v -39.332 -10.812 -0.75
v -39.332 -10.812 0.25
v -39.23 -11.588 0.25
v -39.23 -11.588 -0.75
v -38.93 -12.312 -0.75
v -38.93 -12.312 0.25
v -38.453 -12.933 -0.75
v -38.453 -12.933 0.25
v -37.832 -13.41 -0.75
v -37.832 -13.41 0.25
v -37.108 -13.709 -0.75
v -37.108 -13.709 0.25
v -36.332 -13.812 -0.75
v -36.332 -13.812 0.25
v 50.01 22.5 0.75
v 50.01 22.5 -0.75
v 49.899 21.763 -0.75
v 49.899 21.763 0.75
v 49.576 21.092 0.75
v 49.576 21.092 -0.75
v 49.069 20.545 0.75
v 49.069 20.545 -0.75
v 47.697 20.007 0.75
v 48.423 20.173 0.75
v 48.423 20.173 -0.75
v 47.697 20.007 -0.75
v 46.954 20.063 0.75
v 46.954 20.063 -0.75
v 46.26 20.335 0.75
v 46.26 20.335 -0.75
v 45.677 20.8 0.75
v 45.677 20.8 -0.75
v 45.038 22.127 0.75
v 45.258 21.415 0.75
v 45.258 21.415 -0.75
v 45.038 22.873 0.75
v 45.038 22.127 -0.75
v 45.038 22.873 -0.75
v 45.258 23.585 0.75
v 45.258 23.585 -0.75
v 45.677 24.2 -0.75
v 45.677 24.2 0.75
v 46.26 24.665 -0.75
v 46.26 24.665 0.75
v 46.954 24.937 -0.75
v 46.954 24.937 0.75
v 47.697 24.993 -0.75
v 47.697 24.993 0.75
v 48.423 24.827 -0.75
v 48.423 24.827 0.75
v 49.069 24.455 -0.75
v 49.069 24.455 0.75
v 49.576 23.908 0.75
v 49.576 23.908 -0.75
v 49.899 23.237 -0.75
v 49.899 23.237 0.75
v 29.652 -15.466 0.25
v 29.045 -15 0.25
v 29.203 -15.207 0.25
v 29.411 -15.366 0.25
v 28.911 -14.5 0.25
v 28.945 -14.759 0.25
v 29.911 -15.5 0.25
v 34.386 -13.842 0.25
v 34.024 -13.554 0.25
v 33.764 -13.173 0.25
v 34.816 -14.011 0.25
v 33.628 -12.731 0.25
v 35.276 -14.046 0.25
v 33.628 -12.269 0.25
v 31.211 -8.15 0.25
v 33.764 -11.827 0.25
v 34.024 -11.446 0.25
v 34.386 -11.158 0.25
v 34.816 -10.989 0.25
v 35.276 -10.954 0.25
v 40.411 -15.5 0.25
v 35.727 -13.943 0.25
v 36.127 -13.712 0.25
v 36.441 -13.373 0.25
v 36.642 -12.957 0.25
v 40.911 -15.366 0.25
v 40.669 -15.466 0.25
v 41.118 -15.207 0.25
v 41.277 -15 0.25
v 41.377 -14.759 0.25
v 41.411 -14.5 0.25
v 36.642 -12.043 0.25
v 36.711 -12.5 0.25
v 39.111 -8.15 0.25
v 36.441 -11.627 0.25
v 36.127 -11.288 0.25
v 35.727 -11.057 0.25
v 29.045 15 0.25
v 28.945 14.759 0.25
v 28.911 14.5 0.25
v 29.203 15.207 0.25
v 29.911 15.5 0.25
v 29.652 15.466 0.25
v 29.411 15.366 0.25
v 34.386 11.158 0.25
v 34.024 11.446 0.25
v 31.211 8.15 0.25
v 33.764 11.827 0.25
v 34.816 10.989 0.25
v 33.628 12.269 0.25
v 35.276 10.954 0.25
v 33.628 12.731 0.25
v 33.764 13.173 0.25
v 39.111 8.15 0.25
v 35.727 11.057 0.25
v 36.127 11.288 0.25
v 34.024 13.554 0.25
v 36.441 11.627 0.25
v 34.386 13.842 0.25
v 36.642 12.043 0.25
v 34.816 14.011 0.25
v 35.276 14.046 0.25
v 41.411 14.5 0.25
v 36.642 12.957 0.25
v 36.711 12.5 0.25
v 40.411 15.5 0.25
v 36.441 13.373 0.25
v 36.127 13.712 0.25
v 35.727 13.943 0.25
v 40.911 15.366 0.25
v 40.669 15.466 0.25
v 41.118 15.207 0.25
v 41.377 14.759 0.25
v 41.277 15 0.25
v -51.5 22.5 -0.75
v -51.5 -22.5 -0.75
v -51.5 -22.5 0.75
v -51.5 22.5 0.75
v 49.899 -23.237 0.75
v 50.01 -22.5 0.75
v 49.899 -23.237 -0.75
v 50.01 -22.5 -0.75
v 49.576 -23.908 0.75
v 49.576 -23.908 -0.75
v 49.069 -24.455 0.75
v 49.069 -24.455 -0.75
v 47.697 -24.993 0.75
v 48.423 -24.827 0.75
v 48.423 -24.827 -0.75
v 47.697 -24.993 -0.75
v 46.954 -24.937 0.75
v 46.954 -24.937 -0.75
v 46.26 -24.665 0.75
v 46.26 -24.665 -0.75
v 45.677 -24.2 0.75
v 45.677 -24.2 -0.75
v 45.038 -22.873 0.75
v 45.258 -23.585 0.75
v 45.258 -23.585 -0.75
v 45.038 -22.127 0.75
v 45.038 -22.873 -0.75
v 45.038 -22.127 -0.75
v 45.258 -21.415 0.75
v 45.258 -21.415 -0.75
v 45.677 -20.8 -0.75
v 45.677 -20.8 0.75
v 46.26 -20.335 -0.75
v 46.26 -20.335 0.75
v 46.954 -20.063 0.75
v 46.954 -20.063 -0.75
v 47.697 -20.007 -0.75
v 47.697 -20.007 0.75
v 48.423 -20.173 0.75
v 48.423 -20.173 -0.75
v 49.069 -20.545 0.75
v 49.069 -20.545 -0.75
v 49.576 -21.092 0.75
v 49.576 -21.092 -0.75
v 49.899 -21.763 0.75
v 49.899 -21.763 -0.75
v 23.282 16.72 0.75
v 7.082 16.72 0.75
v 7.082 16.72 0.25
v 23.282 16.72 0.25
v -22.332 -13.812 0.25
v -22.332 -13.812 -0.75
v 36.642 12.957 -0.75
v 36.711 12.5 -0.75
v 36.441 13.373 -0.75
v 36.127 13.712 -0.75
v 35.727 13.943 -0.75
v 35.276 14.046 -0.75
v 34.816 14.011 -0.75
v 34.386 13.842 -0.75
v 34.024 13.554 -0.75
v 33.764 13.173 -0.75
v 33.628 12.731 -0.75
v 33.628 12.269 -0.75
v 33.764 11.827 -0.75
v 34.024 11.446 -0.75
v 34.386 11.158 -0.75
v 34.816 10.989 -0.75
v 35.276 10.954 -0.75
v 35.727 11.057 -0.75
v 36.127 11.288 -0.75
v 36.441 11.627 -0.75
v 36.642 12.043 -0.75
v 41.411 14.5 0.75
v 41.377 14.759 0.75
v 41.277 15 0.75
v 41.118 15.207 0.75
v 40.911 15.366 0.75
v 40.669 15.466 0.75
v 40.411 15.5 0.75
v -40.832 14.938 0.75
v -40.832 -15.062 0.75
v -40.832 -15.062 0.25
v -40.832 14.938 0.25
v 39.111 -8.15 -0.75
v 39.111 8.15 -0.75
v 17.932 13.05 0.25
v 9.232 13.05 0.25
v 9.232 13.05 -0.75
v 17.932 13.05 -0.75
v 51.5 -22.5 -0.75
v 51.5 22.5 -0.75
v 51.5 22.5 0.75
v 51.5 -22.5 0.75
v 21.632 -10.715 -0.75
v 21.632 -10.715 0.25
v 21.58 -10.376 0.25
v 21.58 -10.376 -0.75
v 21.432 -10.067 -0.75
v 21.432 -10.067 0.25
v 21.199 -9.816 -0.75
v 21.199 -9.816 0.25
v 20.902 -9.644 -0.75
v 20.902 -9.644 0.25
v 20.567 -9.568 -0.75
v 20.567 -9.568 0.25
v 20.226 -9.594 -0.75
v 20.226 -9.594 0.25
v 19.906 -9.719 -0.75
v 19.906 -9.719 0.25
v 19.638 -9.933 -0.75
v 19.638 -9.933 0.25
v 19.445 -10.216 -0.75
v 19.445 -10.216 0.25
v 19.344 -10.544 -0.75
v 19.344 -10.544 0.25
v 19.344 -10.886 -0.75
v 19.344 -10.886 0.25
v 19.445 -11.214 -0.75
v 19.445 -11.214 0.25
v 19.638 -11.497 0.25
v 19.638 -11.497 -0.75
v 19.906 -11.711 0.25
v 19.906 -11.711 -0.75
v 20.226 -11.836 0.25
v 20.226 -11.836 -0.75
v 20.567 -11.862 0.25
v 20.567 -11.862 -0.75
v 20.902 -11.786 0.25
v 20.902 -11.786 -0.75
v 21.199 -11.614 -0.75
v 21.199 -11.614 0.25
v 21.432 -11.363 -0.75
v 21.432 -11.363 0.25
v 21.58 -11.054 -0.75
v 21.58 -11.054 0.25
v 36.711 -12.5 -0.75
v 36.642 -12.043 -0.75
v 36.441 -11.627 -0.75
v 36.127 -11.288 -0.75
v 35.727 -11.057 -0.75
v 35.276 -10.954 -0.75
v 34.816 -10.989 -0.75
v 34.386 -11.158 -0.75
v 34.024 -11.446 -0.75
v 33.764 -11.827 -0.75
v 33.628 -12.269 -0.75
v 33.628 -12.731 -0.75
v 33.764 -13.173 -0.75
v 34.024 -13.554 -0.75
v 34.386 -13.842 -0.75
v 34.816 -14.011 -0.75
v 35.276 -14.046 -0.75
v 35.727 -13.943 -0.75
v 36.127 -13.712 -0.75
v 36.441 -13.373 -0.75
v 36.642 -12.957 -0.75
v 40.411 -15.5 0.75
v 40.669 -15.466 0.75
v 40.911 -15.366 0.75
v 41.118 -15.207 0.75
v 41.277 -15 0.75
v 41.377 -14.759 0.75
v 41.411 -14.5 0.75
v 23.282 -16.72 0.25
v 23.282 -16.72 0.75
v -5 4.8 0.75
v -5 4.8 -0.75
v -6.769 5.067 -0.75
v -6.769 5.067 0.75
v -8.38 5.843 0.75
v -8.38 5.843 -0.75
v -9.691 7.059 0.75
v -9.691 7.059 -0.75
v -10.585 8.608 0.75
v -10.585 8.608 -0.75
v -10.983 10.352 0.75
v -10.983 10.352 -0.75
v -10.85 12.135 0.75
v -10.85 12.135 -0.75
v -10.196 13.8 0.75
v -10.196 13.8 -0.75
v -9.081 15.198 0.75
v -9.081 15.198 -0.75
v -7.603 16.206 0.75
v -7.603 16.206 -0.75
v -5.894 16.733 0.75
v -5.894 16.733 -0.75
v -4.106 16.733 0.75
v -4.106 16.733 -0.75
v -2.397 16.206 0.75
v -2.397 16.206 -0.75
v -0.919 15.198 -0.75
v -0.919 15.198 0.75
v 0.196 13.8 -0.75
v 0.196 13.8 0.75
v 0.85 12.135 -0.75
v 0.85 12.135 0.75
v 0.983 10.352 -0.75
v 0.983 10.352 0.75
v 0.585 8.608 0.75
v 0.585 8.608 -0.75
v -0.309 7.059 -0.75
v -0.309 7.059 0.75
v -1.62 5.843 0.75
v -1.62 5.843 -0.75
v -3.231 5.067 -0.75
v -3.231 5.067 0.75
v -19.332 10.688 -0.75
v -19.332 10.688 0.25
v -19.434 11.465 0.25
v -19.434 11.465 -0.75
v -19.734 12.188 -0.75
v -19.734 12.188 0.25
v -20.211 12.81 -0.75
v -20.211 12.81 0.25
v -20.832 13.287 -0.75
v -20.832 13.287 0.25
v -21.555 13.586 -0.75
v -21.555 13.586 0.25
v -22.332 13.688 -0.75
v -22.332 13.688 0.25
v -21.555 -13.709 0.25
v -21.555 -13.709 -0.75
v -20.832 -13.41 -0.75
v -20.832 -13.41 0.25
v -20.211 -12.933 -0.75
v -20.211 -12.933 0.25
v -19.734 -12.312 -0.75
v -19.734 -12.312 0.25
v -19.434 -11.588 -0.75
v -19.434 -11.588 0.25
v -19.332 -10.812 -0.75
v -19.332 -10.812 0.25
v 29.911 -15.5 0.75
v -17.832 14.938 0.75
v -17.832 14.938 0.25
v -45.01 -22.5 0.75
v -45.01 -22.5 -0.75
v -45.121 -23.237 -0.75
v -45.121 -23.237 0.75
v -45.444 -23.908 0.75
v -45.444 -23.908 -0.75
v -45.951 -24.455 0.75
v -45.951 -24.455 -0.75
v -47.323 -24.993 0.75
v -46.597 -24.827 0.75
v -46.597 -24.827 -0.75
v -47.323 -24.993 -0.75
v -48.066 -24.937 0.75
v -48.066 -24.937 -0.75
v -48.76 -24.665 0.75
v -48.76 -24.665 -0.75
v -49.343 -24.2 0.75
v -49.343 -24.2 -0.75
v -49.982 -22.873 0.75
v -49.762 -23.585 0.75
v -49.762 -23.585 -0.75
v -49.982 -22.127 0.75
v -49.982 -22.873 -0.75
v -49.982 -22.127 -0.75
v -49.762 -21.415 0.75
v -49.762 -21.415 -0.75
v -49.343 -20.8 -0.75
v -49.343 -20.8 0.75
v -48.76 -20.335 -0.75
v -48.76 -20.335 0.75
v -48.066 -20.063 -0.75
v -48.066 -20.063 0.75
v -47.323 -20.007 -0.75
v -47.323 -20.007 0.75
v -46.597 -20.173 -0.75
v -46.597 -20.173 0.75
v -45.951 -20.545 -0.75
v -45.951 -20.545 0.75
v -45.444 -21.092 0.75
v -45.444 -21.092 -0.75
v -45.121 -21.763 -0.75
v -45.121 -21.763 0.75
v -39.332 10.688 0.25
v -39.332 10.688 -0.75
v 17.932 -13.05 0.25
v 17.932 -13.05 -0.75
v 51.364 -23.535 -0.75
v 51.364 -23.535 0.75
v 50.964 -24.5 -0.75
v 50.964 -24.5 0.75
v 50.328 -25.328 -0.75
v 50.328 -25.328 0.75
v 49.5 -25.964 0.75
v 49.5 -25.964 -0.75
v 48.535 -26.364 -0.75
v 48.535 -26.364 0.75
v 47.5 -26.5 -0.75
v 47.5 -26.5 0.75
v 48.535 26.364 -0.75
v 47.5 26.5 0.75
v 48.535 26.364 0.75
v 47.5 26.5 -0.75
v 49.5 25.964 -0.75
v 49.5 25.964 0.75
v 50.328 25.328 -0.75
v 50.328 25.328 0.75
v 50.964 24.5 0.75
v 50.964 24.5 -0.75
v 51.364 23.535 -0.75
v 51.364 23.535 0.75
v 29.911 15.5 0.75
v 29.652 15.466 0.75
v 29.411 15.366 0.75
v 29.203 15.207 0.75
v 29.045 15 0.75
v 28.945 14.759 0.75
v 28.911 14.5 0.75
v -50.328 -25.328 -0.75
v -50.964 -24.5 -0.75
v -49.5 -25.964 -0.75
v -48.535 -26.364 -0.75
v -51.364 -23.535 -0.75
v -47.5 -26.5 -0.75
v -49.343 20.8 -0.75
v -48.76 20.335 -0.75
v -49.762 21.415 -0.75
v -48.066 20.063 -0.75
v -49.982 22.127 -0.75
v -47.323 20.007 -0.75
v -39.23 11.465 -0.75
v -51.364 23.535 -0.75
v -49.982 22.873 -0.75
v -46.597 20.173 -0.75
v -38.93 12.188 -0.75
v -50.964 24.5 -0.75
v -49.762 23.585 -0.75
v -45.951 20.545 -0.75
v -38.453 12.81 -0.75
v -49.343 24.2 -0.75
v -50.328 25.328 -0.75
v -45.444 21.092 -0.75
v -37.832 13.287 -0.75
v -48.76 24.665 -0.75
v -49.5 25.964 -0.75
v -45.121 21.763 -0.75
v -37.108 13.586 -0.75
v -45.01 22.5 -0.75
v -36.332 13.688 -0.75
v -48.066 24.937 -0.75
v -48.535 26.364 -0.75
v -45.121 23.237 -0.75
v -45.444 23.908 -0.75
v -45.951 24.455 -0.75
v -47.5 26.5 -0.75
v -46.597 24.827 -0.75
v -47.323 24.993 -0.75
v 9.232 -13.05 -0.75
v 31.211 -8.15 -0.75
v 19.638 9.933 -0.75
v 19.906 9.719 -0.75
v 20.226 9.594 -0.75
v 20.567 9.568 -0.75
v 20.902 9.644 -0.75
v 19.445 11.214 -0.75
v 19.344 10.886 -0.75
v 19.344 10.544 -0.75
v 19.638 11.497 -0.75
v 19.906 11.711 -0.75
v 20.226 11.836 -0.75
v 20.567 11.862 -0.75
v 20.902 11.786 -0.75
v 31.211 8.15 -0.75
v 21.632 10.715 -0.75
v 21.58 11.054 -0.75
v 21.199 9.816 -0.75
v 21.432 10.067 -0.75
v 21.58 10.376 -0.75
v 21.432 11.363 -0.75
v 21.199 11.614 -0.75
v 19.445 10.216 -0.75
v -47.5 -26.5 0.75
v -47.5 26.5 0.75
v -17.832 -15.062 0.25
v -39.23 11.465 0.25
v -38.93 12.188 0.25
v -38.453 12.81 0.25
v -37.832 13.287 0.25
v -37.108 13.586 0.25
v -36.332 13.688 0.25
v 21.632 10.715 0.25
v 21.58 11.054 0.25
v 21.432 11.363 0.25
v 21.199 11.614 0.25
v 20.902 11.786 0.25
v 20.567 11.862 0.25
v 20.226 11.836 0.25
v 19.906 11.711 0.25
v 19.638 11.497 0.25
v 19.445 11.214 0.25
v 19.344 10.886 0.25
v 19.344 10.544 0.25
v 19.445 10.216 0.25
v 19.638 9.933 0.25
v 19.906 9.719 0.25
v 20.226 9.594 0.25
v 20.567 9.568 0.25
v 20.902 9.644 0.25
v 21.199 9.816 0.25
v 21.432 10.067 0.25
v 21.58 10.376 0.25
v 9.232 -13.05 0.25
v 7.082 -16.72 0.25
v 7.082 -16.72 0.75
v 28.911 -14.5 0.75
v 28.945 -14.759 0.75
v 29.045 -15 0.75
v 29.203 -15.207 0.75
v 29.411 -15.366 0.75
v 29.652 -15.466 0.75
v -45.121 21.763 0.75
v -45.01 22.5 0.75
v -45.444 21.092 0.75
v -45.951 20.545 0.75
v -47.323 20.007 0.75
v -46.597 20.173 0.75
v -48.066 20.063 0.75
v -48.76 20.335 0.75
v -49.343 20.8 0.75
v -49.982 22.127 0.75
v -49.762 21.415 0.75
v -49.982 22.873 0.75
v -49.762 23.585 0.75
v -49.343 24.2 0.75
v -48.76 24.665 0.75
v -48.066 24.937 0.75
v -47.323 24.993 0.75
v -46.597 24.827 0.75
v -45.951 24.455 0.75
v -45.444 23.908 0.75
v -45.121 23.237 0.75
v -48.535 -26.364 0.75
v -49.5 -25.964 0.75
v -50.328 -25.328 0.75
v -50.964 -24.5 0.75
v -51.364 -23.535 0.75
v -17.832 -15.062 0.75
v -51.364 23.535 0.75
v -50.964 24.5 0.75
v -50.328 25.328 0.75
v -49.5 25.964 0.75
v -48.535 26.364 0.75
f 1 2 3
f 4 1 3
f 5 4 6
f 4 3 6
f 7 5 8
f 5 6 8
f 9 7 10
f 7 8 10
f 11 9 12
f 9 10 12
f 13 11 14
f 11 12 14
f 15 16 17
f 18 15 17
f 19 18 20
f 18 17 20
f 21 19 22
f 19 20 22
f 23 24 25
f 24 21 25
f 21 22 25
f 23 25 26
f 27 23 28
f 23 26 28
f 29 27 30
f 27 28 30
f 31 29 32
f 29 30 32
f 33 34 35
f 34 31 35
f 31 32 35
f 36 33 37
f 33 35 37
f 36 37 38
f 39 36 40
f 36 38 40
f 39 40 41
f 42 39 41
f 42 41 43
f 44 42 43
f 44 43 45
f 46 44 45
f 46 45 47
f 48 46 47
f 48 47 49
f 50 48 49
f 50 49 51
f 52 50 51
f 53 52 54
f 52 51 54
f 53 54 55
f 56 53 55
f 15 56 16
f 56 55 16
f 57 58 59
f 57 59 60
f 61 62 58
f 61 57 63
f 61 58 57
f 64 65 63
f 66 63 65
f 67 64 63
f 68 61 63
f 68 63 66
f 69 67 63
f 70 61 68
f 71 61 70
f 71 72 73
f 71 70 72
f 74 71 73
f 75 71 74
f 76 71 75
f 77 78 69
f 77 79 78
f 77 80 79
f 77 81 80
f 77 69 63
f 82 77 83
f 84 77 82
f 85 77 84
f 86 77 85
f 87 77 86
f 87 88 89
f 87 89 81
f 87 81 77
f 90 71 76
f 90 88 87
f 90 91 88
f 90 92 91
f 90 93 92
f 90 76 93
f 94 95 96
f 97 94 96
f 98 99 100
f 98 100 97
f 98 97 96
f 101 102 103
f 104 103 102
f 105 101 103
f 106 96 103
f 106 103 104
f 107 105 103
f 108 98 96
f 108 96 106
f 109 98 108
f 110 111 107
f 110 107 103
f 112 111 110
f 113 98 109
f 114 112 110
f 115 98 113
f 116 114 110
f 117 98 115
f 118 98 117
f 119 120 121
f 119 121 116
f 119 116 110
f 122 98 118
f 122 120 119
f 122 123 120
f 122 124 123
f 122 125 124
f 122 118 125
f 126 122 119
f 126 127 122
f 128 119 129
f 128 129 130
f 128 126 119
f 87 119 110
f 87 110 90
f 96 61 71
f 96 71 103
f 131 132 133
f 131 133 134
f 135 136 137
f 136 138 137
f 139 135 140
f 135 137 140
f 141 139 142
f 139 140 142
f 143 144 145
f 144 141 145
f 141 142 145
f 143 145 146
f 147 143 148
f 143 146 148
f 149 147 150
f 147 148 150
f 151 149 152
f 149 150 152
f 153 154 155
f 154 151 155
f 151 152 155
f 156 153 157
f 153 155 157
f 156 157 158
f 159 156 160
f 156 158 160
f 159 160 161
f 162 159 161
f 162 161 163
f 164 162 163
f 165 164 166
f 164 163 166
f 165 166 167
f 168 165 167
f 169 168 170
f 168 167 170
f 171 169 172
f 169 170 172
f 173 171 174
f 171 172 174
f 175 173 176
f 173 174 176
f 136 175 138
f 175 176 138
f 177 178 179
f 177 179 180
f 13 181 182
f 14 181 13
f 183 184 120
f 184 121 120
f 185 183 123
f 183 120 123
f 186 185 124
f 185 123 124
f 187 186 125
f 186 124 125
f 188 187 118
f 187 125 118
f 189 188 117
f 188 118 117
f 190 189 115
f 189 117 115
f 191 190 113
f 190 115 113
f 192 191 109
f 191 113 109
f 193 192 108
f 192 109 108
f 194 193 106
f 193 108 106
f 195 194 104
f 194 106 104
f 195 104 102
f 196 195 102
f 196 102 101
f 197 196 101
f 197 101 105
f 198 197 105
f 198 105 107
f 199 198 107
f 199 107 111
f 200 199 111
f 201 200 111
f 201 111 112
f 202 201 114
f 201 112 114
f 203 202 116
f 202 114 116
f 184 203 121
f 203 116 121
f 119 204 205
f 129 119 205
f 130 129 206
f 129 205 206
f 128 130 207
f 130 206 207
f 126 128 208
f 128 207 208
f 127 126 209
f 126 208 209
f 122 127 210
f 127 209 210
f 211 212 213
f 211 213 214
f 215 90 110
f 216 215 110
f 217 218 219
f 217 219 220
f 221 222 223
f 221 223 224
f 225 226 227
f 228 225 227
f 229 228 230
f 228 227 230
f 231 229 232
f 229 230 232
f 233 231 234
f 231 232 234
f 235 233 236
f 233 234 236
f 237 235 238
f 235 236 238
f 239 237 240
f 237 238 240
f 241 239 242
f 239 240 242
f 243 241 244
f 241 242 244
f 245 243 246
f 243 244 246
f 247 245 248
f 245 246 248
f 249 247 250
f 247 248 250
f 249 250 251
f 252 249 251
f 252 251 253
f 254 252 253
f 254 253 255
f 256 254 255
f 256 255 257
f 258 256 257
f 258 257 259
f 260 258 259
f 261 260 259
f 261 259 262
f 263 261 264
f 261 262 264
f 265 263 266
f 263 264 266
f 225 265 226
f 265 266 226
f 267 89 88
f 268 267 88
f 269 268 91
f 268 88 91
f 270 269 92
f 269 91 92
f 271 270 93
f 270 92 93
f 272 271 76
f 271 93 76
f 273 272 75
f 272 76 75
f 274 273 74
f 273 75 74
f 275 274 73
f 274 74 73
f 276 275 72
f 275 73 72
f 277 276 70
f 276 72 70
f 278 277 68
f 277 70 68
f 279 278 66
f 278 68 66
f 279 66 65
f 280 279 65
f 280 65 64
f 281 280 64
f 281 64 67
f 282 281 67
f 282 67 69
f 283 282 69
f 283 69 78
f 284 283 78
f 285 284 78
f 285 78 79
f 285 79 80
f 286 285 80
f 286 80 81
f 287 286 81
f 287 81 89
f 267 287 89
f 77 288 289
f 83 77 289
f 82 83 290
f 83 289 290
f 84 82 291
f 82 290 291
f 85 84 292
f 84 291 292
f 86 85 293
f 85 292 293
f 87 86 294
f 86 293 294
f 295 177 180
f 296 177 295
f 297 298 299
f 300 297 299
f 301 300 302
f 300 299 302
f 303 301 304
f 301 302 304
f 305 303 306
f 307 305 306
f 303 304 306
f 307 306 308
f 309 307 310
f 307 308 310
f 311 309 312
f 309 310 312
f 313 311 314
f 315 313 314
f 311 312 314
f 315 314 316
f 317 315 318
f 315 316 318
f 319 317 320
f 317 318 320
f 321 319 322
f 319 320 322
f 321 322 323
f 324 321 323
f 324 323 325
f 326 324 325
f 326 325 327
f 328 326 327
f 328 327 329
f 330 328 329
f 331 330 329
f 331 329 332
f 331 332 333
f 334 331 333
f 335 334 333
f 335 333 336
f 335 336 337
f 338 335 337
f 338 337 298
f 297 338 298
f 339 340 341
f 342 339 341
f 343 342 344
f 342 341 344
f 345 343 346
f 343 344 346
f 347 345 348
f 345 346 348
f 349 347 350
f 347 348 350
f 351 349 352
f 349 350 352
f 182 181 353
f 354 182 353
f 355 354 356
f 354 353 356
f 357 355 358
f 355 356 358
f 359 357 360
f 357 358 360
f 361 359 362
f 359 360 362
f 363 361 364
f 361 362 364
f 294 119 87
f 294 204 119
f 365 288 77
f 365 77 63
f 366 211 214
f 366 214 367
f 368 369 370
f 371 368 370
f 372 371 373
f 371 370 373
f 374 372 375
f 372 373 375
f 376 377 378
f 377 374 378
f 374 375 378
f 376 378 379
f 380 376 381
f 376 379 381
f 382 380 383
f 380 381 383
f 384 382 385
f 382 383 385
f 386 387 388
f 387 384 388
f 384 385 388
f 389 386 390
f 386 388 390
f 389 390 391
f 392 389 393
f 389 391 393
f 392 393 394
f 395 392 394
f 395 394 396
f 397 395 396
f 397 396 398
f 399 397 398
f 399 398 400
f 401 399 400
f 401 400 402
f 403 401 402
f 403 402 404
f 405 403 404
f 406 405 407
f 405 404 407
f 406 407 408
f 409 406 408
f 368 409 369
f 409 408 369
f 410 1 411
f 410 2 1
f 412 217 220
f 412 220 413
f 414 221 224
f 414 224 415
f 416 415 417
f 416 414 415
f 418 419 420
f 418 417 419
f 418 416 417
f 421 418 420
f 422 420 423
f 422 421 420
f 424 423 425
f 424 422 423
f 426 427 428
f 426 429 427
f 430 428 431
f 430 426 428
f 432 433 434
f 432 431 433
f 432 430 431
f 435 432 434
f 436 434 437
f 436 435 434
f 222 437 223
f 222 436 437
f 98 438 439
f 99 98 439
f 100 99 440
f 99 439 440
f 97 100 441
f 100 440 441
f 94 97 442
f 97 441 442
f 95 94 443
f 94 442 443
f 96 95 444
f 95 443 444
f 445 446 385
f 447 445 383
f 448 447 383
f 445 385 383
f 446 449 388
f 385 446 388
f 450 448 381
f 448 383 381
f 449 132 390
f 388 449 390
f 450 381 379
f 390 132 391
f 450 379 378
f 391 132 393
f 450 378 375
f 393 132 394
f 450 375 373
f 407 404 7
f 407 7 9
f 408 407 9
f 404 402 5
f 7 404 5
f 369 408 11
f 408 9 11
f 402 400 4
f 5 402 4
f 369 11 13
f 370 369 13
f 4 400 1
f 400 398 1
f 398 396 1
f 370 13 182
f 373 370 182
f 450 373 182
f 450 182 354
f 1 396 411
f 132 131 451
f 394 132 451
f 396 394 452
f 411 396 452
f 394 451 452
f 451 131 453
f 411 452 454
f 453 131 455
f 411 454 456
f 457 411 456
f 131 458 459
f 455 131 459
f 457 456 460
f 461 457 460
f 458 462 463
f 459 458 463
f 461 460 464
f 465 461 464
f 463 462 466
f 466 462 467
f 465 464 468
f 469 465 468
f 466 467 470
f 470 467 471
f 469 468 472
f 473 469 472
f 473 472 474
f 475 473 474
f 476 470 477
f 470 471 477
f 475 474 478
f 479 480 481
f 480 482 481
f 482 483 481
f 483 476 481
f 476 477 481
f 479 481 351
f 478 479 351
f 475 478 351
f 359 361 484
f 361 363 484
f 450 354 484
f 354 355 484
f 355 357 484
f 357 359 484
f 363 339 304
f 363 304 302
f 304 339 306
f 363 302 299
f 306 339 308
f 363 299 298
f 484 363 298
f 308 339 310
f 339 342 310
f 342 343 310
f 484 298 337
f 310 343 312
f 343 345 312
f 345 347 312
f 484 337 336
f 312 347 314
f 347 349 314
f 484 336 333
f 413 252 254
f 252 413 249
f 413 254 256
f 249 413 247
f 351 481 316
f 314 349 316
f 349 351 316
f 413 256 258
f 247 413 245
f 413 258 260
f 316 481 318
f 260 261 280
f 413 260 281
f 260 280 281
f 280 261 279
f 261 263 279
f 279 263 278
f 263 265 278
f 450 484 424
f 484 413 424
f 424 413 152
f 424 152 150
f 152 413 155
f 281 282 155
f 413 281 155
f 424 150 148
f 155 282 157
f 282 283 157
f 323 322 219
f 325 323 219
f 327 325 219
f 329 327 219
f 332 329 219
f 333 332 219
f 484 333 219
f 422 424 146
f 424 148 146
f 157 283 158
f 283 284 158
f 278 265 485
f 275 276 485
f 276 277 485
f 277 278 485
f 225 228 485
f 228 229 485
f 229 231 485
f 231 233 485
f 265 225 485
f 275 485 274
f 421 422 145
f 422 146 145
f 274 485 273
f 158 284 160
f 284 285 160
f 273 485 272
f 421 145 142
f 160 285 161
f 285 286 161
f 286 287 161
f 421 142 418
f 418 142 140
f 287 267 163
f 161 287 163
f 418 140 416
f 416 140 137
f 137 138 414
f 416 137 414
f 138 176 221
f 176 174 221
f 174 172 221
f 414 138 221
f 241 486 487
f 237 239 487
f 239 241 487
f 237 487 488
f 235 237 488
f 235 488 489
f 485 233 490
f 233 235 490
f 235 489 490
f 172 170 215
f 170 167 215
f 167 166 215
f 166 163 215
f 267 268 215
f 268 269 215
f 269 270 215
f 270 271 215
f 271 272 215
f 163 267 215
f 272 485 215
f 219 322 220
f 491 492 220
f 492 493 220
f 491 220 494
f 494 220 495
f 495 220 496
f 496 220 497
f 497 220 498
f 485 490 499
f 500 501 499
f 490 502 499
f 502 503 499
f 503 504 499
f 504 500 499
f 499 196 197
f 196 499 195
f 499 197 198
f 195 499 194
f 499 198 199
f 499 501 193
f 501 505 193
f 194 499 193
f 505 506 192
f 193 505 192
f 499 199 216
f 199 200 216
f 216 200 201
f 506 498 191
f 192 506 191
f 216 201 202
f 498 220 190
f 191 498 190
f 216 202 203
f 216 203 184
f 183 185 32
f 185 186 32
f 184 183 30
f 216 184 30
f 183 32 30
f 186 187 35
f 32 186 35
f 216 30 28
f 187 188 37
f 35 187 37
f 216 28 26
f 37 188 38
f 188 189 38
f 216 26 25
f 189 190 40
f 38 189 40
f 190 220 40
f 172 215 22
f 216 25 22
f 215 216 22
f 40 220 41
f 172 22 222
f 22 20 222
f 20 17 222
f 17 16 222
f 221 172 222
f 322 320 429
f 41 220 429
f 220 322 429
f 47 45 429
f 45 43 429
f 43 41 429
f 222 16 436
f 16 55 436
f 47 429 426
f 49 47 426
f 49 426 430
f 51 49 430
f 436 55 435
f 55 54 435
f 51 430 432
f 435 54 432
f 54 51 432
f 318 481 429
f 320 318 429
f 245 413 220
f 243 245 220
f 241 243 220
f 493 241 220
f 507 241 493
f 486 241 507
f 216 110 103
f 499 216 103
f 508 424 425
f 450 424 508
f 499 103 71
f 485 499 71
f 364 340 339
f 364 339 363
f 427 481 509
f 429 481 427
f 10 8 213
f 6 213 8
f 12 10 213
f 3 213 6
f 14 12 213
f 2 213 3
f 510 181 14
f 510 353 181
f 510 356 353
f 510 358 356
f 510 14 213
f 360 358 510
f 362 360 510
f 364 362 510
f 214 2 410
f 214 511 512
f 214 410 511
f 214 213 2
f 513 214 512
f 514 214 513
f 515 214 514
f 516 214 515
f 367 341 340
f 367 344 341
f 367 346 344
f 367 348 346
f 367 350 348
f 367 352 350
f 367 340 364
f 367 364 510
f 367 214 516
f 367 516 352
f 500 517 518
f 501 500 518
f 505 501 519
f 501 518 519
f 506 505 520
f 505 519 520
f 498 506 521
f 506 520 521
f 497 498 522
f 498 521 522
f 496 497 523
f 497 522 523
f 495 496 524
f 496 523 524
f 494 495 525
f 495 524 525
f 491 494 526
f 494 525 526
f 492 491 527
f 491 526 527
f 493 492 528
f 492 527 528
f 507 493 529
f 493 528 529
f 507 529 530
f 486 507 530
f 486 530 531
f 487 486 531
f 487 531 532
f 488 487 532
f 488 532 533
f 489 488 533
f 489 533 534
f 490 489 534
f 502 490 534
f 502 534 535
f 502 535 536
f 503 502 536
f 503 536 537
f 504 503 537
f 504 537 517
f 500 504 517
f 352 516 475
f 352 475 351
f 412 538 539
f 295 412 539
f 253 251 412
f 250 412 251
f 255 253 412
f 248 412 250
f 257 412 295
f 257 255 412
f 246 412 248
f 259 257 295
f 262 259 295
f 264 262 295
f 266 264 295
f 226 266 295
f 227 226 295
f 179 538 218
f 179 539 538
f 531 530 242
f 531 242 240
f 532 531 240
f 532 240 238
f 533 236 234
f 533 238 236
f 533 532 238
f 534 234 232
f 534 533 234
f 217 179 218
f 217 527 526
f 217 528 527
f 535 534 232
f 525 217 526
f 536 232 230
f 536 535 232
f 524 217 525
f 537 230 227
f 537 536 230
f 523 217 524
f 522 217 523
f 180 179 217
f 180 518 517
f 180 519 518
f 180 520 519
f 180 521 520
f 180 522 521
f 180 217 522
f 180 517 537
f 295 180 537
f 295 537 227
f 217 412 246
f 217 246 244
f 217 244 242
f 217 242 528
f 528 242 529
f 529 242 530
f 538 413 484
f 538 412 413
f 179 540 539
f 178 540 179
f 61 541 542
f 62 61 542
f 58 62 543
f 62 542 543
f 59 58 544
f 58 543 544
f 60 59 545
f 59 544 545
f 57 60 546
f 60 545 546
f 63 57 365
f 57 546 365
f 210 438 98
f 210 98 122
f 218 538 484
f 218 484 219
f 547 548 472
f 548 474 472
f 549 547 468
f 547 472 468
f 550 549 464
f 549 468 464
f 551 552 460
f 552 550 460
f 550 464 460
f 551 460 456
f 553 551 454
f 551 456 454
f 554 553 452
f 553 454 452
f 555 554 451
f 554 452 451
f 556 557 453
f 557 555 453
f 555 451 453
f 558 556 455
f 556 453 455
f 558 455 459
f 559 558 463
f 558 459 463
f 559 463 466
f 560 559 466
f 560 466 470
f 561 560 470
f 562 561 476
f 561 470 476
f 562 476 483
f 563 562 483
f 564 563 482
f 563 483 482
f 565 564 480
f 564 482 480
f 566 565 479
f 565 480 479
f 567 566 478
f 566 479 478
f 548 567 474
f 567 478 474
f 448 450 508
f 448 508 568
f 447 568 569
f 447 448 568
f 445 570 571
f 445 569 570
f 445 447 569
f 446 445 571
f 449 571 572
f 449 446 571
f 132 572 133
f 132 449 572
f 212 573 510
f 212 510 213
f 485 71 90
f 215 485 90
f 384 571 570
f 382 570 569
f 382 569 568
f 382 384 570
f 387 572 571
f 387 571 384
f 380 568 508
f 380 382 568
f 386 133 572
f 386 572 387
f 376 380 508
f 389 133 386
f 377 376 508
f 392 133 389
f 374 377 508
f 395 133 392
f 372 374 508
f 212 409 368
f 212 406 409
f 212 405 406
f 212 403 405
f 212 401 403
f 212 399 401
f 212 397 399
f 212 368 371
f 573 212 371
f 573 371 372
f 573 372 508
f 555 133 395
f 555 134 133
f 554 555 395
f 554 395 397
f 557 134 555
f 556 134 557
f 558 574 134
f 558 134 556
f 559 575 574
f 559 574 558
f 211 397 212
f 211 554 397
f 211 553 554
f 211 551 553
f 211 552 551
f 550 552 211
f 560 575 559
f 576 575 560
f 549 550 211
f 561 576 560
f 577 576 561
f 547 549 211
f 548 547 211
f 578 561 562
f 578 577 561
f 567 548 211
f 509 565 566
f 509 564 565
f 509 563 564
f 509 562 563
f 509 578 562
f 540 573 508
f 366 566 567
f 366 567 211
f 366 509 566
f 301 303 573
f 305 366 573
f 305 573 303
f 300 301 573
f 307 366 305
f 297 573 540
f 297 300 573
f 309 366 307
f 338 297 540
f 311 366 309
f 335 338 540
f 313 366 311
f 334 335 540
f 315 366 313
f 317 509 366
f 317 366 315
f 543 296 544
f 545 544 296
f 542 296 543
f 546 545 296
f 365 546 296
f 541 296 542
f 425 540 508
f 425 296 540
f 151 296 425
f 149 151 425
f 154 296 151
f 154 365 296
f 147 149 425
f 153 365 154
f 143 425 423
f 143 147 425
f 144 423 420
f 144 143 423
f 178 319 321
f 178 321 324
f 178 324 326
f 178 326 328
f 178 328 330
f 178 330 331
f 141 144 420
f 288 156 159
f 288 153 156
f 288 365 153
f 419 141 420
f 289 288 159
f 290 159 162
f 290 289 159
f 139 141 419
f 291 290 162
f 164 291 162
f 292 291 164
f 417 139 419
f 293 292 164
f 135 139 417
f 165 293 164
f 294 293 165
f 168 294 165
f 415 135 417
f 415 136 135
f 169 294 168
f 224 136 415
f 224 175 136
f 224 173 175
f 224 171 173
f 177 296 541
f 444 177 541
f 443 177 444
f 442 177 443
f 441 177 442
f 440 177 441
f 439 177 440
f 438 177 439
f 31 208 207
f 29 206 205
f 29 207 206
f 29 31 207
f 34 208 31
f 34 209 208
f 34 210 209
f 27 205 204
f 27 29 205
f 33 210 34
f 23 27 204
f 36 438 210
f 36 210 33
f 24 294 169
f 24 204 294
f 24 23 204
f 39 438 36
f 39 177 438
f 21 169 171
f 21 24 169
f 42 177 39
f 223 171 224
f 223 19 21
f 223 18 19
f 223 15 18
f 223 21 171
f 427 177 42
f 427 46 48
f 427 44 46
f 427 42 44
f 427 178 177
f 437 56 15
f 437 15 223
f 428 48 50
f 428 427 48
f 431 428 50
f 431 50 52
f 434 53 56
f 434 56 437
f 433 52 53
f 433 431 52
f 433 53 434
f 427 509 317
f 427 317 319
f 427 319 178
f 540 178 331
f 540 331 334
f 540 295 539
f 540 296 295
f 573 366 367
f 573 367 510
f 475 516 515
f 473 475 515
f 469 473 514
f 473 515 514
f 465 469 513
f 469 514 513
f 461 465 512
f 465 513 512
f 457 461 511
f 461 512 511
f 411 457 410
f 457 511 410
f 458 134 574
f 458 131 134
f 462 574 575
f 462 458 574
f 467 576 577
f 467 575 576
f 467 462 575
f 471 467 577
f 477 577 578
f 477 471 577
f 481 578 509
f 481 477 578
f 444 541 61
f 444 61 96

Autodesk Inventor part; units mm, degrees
ref_plane "YZ Plane" through (0, 0, 0) normal (1, 0, 0) x (0, 1, 0)
ref_plane "XZ Plane" through (0, 0, 0) normal (0, 1, 0) x (-1, 0, 0)
ref_plane "XY Plane" through (0, 0, 0) normal (0, 0, 1) x (1, 0, 0)
sketch "Sketch1" plane through (0, 0, 0) normal (0, 0, 1) x (1, 0, 0)
  line L0 (-47.5, 26.5) -> (47.5, 26.5)
  line L1 (51.5, 22.5) -> (51.5, -22.5)
  line L2 (47.5, -26.5) -> (-47.5, -26.5)
  line L3 (-51.5, -22.5) -> (-51.5, 22.5)
  arc A0 (-51.5, -22.5) -> (-47.5, -26.5) centre (-47.5, -22.5) ccw
  arc A1 (47.5, -26.5) -> (51.5, -22.5) centre (47.5, -22.5) ccw
  arc A2 (51.5, 22.5) -> (47.5, 26.5) centre (47.5, 22.5) ccw
  arc A3 (-47.5, 26.5) -> (-51.5, 22.5) centre (-47.5, 22.5) ccw
  line L4 (-47.51, 22.5) -> (47.51, 22.5) construction
  line L5 (47.51, 22.5) -> (47.51, -22.5) construction
  line L6 (47.51, -22.5) -> (-47.51, -22.5) construction
  line L7 (-47.51, -22.5) -> (-47.51, 22.5) construction
  circle A4 centre (-47.51, 22.5) radius 2.5
  circle A5 centre (47.51, 22.5) radius 2.5
  circle A6 centre (-47.51, -22.5) radius 2.5
  circle A7 centre (47.51, -22.5) radius 2.5
  point P0 (0, 0)
  point P1 (-51.5, 26.5)
  point P2 (51.5, -26.5)
  point P3 (51.5, 26.5)
  point P4 (0, 26.5)
  point P5 (51.5, 0)
  point P6 (47.51, 0)
  point P7 (0, 22.5)
  dimension "d0" = 103
  dimension "d1" = 53
  dimension "d3" = 4
  dimension "d4" = 95.02
  dimension "d5" = 45
  dimension "d6" = 5
  dimension "d7" = 5
  dimension "d8" = 5
  dimension "d9" = 5
extrude "Extrusion1" add sketch "Sketch1" along normal mid plane 1.5
sketch "Sketch2" plane through (0, 0, 0.75) normal (0, 0, 1) x (1, 0, 0)
  line L0 (47.5, 26.5) -> (-47.5, 26.5) projected
  point P0 (0, 0)
  point P1 (-5, 10.8)
  dimension "d51" = 5
  dimension "d52" = 15.7
hole "Neon" at (-5, 10.8, 0.75) direction (0, 0, -1) diameter 12 end through all
sketch "Sketch3" plane through (0, 0, 0.75) normal (0, 0, 1) x (1, 0, 0)
  line L0 (-36.3319, 13.6885) -> (-22.3319, 13.6885)
  line L1 (-19.3319, 10.6885) -> (-19.3319, -10.8115)
  line L2 (-22.3319, -13.8115) -> (-36.3319, -13.8115)
  line L3 (-39.3319, -10.8115) -> (-39.3319, 10.6885)
  arc A0 (-36.3319, 13.6885) -> (-39.3319, 10.6885) centre (-36.3319, 10.6885) ccw
  arc A1 (-19.3319, 10.6885) -> (-22.3319, 13.6885) centre (-22.3319, 10.6885) ccw
  arc A2 (-22.3319, -13.8115) -> (-19.3319, -10.8115) centre (-22.3319, -10.8115) ccw
  arc A3 (-39.3319, -10.8115) -> (-36.3319, -13.8115) centre (-36.3319, -10.8115) ccw
  line L4 (-40.8319, 14.9385) -> (-17.8319, 14.9385)
  line L5 (-17.8319, 14.9385) -> (-17.8319, -15.0615)
  line L6 (-17.8319, -15.0615) -> (-40.8319, -15.0615)
  line L7 (-40.8319, -15.0615) -> (-40.8319, 14.9385)
  point P0 (0, 0)
  point P1 (-39.3319, 13.6885)
  point P2 (-19.3319, -13.8115)
  point P3 (-19.3319, 13.6885)
  point P4 (-17.8319, -0.0615)
  point P5 (-19.3319, -0.0615)
  point P6 (-29.3319, 14.9385)
  point P7 (-29.3319, 13.6885)
  dimension "d20" = 20
  dimension "d21" = 27.5
  dimension "d22" = 3
  dimension "d37" = 30
  dimension "d38" = 23
extrude "IEC" cut sketch "Sketch3" against normal through all contours L0 A1 L1 A2 L2 A3 L3 A0
sketch "Sketch4" plane through (0, 0, 0.75) normal (0, 0, 1) x (1, 0, 0)
  line L0 (39.1106, 8.15) -> (31.2106, 8.15)
  line L1 (31.2106, 8.15) -> (31.2106, -8.15)
  line L2 (31.2106, -8.15) -> (39.1106, -8.15)
  line L3 (39.1106, -8.15) -> (39.1106, 8.15)
  circle A0 centre (35.1606, 12.5) radius 1.55
  circle A1 centre (35.1606, -12.5) radius 1.55
  line L4 (35.1606, 12.5) -> (35.1606, -12.5) construction
  line L5 (29.9106, 15.5) -> (40.4106, 15.5)
  line L6 (41.4106, 14.5) -> (41.4106, -14.5)
  line L7 (40.4106, -15.5) -> (29.9106, -15.5)
  line L8 (28.9106, -14.5) -> (28.9106, 14.5)
  arc A2 (41.4106, 14.5) -> (40.4106, 15.5) centre (40.4106, 14.5) ccw
  arc A3 (29.9106, 15.5) -> (28.9106, 14.5) centre (29.9106, 14.5) ccw
  arc A4 (28.9106, -14.5) -> (29.9106, -15.5) centre (29.9106, -14.5) ccw
  arc A5 (40.4106, -15.5) -> (41.4106, -14.5) centre (40.4106, -14.5) ccw
  point P0 (0, 0)
  point P1 (35.1606, 8.15)
  point P2 (35.1606, -8.15)
  point P3 (35.1606, 0)
  point P4 (39.1106, 0)
  point P5 (41.4106, 0)
  point P6 (35.1606, 15.5)
  dimension "d25" = 7.9
  dimension "d26" = 16.3
  dimension "d27" = 3.1
  dimension "d28" = 3.1
  dimension "d29" = 25
  dimension "d30" = 1
  dimension "d31" = 31
  dimension "d32" = 12.5
extrude "SUB-D" cut sketch "Sketch4" against normal through all contours L3 L2 L1 L0 | A0 | A1
extrude "Extrusion4" cut sketch "Sketch4" against normal blind 0.5
extrude "Extrusion5" cut sketch "Sketch3" against normal blind 0.5
sketch "Sketch5" plane through (0, 0, 0.75) normal (0, 0, 1) x (1, 0, 0)
  line L0 (7.0815, 16.72) -> (23.2815, 16.72)
  line L1 (23.2815, 16.72) -> (23.2815, -16.72)
  line L2 (23.2815, -16.72) -> (7.0815, -16.72)
  line L3 (7.0815, -16.72) -> (7.0815, 16.72)
  line L4 (9.2315, 13.05) -> (17.9315, 13.05)
  line L5 (17.9315, 13.05) -> (17.9315, -13.05)
  line L6 (17.9315, -13.05) -> (9.2315, -13.05)
  line L7 (9.2315, -13.05) -> (9.2315, 13.05)
  line L8 (20.4815, 10.715) -> (20.4815, -10.715) construction
  circle A0 centre (20.4815, 10.715) radius 1.15
  circle A1 centre (20.4815, -10.715) radius 1.15
  point P0 (0, 0)
  point P1 (17.9315, 0)
  point P2 (23.2815, 0)
  point P3 (20.4815, 0)
  point P4 (7.0815, 0)
  dimension "d41" = 16.2
  dimension "d42" = 33.44
  dimension "d43" = 8.7
  dimension "d44" = 14.05
  dimension "d45" = 2.8
  dimension "d46" = 21.43
  dimension "d47" = 26.1
  dimension "d48" = 2.3
  dimension "d49" = 2.3
extrude "Extrusion6" cut sketch "Sketch5" against normal through all contours L4 L5 L6 L7 | A0 | A1
extrude "Extrusion7" cut sketch "Sketch5" against normal blind 0.5
properties part number "Paneeltje"
